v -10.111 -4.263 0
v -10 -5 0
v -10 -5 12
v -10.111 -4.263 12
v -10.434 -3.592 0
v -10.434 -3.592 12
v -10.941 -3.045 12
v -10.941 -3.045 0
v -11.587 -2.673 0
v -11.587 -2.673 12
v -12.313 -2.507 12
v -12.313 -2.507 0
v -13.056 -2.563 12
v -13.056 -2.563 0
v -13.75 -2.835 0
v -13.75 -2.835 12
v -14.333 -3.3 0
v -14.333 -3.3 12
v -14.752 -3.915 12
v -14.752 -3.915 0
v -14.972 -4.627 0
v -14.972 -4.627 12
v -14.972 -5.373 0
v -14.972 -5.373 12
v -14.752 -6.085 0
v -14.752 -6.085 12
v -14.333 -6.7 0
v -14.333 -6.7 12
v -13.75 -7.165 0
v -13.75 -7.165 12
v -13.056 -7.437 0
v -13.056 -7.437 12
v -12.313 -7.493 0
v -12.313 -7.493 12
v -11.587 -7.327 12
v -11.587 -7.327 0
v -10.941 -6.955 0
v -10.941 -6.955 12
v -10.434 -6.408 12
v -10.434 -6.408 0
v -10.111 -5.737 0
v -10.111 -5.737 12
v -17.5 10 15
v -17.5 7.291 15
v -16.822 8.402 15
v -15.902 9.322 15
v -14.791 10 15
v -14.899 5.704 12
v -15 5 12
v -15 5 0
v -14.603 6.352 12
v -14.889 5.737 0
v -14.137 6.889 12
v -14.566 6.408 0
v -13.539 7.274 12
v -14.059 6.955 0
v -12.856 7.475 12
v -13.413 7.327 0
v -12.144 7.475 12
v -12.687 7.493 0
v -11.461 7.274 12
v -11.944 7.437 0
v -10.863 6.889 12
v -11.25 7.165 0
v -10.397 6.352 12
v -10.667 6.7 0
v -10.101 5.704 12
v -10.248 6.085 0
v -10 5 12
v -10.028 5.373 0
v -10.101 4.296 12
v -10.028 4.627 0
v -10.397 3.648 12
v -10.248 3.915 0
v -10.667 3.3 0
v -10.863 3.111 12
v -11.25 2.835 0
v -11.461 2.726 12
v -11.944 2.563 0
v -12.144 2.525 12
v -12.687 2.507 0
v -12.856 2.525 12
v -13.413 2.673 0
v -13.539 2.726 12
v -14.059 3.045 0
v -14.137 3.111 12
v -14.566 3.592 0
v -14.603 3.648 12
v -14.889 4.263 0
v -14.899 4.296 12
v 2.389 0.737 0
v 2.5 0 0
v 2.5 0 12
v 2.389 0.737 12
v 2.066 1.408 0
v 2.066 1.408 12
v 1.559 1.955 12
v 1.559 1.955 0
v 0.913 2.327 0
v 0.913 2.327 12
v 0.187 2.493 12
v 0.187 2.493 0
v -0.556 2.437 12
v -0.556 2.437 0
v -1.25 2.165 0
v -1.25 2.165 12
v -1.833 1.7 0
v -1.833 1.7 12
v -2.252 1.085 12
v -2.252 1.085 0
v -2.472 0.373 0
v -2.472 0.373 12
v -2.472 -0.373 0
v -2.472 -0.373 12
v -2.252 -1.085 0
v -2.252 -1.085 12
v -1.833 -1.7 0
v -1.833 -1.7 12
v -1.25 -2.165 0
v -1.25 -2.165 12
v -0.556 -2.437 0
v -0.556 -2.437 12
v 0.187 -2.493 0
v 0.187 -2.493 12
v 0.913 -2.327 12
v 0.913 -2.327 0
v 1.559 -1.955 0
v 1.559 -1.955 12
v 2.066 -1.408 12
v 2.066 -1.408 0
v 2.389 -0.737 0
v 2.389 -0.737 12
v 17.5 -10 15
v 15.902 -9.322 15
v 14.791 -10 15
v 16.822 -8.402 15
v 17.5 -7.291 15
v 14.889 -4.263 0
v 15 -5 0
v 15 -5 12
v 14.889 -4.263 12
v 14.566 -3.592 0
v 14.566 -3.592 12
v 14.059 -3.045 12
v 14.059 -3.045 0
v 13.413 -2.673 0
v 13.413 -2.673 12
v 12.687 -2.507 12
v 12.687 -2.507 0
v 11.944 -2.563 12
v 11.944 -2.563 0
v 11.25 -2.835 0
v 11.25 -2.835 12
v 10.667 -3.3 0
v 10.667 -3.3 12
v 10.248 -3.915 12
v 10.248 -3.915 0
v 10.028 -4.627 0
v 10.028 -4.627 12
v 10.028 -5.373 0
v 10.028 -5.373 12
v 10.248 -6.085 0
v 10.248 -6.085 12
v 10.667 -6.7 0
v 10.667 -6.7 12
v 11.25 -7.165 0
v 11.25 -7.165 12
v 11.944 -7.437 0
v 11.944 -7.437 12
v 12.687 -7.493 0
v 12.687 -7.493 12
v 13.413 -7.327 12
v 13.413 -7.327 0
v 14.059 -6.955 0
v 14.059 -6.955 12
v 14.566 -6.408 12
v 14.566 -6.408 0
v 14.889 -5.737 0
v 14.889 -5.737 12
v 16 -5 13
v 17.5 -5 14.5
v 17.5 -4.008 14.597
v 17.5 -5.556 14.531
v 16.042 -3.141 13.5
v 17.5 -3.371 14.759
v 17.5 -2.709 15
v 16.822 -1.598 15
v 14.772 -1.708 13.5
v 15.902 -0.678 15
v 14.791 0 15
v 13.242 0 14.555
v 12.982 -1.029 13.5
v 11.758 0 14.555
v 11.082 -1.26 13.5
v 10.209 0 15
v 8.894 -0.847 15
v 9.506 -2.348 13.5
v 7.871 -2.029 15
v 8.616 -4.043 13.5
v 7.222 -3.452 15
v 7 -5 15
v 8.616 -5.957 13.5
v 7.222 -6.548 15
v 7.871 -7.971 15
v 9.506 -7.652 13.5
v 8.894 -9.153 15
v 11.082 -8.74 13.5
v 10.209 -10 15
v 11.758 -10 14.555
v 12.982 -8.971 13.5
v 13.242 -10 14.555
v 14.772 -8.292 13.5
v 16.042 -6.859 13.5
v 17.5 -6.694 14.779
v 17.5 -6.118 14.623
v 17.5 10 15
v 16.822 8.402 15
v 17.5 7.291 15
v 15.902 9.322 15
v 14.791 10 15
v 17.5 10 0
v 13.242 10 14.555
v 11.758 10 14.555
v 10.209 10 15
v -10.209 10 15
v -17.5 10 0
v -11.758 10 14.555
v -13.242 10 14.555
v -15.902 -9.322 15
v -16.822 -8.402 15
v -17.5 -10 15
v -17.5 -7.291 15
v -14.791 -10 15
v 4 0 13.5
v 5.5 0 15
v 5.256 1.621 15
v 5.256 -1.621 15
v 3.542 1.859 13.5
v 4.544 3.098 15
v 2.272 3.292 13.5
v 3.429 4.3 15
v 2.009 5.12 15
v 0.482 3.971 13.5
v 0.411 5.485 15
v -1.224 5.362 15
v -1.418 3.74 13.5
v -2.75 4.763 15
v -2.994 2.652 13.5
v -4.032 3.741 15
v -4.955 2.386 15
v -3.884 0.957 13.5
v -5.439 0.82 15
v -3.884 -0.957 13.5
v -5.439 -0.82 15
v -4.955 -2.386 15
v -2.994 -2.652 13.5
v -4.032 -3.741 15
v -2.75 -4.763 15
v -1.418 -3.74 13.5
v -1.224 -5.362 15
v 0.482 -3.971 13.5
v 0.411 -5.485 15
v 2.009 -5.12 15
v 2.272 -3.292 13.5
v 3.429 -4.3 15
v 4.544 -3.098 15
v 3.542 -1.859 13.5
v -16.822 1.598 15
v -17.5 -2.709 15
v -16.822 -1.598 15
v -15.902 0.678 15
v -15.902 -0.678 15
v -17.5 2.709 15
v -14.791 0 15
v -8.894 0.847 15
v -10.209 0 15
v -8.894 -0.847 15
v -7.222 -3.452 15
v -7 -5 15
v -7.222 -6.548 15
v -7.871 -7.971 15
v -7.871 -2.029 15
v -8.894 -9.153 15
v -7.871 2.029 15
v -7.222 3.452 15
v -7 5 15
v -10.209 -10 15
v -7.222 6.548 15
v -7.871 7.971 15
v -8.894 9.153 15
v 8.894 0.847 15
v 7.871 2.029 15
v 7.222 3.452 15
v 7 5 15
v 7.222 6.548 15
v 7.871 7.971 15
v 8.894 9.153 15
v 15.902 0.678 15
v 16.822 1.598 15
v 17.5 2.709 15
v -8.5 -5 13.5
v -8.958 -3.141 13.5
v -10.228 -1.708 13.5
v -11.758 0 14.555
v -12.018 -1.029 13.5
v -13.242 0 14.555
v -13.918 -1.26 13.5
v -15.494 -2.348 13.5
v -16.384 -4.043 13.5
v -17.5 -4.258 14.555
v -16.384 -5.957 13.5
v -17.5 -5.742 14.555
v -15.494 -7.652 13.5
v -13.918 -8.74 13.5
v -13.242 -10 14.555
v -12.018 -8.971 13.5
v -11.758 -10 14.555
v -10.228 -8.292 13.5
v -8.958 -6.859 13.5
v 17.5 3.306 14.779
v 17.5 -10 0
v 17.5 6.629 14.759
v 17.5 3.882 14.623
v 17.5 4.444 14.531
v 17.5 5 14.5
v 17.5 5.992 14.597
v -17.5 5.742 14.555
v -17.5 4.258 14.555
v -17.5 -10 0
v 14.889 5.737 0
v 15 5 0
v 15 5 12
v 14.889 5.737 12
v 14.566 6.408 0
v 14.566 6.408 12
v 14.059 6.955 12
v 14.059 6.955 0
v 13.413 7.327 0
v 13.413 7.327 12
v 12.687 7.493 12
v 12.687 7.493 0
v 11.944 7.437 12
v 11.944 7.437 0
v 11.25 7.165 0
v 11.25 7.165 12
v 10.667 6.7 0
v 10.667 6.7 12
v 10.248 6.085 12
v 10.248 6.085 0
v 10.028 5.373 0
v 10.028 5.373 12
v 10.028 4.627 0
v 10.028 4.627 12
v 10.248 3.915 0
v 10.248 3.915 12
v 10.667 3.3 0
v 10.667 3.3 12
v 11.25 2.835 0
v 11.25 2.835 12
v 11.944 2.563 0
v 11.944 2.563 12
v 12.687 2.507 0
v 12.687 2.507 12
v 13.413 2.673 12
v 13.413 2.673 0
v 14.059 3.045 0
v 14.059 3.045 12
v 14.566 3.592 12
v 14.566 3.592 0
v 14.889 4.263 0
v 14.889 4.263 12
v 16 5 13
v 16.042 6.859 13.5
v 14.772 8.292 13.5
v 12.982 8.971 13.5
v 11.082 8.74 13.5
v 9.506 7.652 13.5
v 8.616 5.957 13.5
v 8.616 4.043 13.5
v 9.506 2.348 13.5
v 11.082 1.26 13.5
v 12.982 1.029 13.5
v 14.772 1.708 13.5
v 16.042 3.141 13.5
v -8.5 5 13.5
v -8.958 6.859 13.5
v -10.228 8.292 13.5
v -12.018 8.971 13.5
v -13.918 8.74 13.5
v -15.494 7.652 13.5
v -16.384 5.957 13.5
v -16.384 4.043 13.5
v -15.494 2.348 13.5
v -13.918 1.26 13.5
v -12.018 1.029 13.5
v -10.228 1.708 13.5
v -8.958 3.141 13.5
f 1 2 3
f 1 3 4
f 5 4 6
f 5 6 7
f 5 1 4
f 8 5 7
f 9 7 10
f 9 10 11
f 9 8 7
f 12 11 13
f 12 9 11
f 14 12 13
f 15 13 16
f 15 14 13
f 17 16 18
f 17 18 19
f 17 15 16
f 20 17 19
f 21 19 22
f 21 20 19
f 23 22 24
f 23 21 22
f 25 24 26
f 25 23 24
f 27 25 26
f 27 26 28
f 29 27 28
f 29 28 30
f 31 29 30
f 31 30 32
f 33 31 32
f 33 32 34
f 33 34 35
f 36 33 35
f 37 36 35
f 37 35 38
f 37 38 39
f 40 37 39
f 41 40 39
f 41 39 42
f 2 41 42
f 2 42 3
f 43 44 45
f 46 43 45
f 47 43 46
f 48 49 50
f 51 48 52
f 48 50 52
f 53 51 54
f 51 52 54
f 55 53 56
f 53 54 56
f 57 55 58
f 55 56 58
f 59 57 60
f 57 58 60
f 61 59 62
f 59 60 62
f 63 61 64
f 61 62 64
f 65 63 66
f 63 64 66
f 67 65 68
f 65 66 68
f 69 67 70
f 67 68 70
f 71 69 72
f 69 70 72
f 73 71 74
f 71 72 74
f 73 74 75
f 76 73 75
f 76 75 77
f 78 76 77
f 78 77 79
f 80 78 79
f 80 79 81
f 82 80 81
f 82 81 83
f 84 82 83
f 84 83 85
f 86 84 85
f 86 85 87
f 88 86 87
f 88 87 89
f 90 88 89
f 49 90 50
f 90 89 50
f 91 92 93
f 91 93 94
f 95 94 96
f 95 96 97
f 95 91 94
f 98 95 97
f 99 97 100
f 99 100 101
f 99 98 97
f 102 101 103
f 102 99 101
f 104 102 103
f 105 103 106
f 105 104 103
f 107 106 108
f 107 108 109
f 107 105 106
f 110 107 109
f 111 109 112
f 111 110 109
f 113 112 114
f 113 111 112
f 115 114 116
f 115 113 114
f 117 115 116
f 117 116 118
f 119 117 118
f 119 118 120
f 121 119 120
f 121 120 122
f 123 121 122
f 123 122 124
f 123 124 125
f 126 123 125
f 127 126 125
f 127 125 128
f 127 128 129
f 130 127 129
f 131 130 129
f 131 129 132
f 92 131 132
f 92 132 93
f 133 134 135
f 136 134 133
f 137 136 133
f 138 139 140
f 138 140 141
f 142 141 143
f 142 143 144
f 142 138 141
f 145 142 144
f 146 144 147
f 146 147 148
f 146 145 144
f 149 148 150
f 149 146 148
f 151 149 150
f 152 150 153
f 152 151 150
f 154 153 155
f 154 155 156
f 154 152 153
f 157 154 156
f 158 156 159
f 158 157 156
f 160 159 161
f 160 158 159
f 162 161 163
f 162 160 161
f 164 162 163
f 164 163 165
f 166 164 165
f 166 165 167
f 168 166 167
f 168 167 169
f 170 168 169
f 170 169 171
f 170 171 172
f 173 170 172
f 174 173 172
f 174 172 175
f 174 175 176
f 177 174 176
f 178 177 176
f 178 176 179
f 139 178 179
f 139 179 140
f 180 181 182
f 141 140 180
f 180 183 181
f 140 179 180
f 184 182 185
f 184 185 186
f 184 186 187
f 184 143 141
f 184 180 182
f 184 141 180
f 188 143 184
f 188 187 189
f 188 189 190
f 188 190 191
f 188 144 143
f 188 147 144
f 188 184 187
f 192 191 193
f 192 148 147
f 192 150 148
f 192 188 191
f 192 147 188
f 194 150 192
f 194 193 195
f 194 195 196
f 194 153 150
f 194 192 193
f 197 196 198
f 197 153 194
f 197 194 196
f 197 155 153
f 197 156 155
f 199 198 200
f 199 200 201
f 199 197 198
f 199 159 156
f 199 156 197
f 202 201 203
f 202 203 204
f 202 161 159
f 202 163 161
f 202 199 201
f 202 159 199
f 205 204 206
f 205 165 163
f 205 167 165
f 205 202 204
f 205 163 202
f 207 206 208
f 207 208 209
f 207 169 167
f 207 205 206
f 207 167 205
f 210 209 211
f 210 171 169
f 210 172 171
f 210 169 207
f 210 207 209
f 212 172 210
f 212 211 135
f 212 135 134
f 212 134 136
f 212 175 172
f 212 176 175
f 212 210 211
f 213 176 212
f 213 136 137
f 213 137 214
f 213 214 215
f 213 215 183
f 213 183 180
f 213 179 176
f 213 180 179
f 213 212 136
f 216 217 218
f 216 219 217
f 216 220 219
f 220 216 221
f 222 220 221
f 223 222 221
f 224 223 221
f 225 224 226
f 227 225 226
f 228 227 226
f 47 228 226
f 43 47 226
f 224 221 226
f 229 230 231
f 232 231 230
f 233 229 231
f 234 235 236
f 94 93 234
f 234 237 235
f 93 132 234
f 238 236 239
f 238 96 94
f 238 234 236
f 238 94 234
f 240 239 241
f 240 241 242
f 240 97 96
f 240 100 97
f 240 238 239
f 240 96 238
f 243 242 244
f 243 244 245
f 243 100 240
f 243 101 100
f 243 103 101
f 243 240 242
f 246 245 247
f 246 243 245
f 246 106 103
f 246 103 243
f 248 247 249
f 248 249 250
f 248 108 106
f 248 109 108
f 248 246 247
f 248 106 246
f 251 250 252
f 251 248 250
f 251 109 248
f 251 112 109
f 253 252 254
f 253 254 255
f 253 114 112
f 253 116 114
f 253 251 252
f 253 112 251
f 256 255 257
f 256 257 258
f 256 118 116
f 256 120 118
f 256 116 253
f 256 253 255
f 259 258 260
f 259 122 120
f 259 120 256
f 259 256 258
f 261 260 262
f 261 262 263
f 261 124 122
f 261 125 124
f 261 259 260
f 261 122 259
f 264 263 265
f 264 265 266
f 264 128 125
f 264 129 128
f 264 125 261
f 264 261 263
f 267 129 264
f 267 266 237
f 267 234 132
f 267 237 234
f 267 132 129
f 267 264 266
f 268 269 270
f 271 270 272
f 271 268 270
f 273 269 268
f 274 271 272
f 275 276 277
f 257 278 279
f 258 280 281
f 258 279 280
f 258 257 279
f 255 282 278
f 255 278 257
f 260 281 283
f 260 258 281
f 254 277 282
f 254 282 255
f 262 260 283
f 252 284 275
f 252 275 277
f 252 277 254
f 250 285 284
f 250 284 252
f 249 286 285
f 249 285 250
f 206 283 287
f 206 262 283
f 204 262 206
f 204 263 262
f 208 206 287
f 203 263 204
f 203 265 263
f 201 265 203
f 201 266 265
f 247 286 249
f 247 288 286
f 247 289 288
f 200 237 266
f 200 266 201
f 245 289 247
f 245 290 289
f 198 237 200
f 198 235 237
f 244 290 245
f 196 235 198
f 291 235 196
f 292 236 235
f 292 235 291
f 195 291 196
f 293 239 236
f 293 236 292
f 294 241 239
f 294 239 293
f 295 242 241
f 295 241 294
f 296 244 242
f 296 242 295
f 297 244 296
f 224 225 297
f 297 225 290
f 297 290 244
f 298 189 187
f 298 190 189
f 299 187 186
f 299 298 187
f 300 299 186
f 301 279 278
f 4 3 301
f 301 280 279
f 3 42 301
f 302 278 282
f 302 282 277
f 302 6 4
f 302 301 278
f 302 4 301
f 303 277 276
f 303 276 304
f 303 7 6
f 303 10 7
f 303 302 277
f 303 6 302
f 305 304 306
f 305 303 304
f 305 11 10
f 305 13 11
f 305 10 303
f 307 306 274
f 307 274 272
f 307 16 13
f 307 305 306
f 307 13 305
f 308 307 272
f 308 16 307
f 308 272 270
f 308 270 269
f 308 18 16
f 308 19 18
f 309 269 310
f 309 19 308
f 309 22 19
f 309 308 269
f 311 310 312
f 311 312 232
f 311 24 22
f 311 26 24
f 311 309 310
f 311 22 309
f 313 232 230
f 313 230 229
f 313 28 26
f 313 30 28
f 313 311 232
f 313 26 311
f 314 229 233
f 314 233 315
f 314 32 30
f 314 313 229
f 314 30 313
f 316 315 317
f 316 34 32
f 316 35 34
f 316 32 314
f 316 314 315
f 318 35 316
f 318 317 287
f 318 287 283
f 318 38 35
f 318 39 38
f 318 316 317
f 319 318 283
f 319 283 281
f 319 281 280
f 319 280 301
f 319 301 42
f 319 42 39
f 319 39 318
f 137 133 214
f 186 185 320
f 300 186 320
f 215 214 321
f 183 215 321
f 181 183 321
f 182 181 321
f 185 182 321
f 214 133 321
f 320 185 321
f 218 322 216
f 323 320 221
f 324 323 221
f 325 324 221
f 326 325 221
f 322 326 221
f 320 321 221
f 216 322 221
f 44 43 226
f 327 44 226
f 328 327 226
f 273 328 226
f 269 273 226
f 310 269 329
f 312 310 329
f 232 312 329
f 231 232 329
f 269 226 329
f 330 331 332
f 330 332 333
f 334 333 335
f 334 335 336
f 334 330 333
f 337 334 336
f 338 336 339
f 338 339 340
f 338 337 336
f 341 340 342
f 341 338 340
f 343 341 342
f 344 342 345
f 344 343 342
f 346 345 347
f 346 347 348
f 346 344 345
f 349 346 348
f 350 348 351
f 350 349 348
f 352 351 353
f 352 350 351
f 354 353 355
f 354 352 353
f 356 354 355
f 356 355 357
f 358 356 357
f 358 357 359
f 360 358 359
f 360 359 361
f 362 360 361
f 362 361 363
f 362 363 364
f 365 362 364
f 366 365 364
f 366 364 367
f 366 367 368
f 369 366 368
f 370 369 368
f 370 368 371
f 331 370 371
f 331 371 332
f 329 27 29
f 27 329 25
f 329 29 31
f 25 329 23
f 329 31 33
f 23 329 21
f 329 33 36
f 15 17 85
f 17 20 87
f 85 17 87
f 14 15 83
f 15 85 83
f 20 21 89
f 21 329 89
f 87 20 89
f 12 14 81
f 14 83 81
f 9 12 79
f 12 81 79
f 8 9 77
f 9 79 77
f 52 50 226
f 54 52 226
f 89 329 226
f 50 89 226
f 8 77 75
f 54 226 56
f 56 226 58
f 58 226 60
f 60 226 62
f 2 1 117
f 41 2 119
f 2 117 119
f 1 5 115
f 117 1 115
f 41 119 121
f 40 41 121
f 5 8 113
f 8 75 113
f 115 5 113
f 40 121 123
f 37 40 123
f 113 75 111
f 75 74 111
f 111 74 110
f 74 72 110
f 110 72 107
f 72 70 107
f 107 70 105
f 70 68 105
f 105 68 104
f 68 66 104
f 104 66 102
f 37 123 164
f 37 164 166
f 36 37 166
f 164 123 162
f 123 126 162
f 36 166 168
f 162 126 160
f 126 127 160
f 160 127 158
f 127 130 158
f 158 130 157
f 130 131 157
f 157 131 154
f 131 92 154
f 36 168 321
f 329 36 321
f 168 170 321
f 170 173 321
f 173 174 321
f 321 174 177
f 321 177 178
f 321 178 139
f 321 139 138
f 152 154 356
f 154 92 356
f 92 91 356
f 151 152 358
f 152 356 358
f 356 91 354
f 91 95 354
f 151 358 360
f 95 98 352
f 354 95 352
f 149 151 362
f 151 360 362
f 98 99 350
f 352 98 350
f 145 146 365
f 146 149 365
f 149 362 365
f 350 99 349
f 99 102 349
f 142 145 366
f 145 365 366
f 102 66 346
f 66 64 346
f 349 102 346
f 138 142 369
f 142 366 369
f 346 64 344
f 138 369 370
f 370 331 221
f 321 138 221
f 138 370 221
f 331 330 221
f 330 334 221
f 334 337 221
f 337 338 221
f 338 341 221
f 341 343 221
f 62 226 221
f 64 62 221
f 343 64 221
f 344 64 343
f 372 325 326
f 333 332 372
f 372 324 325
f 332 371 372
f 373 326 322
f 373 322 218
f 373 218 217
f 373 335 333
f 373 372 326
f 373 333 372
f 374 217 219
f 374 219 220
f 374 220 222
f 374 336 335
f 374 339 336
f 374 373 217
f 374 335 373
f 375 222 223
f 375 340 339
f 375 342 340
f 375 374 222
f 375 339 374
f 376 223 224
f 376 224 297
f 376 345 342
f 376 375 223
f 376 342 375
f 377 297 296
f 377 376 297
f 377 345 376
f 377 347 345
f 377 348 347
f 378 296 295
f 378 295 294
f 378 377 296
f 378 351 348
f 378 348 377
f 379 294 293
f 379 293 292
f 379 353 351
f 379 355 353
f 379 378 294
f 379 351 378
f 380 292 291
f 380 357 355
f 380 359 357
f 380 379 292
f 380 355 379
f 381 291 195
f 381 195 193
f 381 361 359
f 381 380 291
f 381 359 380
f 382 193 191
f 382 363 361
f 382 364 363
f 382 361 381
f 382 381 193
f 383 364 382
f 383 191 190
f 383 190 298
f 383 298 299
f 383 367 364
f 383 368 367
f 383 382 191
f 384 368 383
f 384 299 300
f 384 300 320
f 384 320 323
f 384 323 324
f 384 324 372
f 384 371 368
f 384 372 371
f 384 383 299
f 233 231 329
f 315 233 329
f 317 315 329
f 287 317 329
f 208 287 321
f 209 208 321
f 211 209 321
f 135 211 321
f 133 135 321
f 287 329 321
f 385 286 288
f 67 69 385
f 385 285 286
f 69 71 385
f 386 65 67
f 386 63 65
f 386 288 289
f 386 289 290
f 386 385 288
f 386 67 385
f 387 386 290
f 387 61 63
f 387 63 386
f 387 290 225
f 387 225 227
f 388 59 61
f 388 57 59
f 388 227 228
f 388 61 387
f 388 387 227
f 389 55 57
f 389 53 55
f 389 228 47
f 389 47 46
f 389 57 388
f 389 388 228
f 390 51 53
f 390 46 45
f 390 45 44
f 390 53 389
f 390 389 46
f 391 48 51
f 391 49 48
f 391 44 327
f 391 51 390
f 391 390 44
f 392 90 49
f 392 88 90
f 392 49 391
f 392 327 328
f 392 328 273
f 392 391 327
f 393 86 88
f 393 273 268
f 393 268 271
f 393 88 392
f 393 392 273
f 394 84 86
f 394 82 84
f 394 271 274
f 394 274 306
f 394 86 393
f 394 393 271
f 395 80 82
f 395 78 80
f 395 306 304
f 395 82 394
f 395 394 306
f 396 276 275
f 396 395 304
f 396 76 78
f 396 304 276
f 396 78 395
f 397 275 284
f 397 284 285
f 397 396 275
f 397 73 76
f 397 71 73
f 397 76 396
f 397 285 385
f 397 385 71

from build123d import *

# Parameters (mm, degrees)
F0_R     = 2.5
F1_DEPTH = 15


# Not quite as in the source:
# - a fillet or chamfer that OpenCascade refuses, or shapes differently, is made with other operations: its cross-section is extruded or revolved along the edge and cut away or added


with BuildPart() as f1:
    # F0 (on Top) → F1 (new body)
    with BuildSketch(Plane.XY):
        Polygon((-7.5, 10), (-17.5, 10), (-17.5, 5), (-17.5, -10), (17.5, -10), (17.5, 10), align=None)
        with Locations((-12.5, -5)):
            Circle(F0_R, mode=Mode.SUBTRACT)
        with Locations((12.5, -5)):
            Circle(F0_R, mode=Mode.SUBTRACT)
        with BuildLine():
            ThreePointArc((-10, 5), (-12.5, 2.5), (-15, 5))
            ThreePointArc((-15, 5), (-12.5, 7.5), (-10, 5))
        make_face(mode=Mode.SUBTRACT)
        Circle(F0_R, mode=Mode.SUBTRACT)
        with Locations((12.5, 5)):
            Circle(F0_R, mode=Mode.SUBTRACT)
    extrude(amount=F1_DEPTH)

    # F2: chamfer of 3 on 5 edges, made by hand

    # F2_s1 → F2_t2 (revolve, cut)
    with BuildSketch(Plane.XZ.offset(-5)):
        Polygon((-7, 15), (-10, 12), (-10, 15), align=None)
    revolve(axis=Axis((-12.5, 5, 15), (0, 0, 1)), mode=Mode.SUBTRACT)

    # F2_s3 → F2_t4 (revolve, cut)
    with BuildSketch(Plane.XZ):
        Polygon((5.5, 15), (2.5, 12), (2.5, 15), align=None)
    revolve(axis=Axis((0, 0, 15), (0, 0, 1)), mode=Mode.SUBTRACT)

    # F2_s5 → F2_t6 (revolve, cut)
    with BuildSketch(Plane.XZ.offset(5)):
        Polygon((-7, 15), (-10, 12), (-10, 15), align=None)
    revolve(axis=Axis((-12.5, -5, 15), (0, 0, 1)), mode=Mode.SUBTRACT)

    # F2_s7 → F2_t8 (revolve, cut)
    with BuildSketch(Plane.XZ.offset(-5)):
        Polygon((18, 15), (15, 12), (15, 15), align=None)
    revolve(axis=Axis((12.5, 5, 15), (0, 0, 1)), mode=Mode.SUBTRACT)

    # F2_s9 → F2_t10 (revolve, cut)
    with BuildSketch(Plane.XZ.offset(5)):
        Polygon((18, 15), (15, 12), (15, 15), align=None)
    revolve(axis=Axis((12.5, -5, 15), (0, 0, 1)), mode=Mode.SUBTRACT)


solid = f1.part
